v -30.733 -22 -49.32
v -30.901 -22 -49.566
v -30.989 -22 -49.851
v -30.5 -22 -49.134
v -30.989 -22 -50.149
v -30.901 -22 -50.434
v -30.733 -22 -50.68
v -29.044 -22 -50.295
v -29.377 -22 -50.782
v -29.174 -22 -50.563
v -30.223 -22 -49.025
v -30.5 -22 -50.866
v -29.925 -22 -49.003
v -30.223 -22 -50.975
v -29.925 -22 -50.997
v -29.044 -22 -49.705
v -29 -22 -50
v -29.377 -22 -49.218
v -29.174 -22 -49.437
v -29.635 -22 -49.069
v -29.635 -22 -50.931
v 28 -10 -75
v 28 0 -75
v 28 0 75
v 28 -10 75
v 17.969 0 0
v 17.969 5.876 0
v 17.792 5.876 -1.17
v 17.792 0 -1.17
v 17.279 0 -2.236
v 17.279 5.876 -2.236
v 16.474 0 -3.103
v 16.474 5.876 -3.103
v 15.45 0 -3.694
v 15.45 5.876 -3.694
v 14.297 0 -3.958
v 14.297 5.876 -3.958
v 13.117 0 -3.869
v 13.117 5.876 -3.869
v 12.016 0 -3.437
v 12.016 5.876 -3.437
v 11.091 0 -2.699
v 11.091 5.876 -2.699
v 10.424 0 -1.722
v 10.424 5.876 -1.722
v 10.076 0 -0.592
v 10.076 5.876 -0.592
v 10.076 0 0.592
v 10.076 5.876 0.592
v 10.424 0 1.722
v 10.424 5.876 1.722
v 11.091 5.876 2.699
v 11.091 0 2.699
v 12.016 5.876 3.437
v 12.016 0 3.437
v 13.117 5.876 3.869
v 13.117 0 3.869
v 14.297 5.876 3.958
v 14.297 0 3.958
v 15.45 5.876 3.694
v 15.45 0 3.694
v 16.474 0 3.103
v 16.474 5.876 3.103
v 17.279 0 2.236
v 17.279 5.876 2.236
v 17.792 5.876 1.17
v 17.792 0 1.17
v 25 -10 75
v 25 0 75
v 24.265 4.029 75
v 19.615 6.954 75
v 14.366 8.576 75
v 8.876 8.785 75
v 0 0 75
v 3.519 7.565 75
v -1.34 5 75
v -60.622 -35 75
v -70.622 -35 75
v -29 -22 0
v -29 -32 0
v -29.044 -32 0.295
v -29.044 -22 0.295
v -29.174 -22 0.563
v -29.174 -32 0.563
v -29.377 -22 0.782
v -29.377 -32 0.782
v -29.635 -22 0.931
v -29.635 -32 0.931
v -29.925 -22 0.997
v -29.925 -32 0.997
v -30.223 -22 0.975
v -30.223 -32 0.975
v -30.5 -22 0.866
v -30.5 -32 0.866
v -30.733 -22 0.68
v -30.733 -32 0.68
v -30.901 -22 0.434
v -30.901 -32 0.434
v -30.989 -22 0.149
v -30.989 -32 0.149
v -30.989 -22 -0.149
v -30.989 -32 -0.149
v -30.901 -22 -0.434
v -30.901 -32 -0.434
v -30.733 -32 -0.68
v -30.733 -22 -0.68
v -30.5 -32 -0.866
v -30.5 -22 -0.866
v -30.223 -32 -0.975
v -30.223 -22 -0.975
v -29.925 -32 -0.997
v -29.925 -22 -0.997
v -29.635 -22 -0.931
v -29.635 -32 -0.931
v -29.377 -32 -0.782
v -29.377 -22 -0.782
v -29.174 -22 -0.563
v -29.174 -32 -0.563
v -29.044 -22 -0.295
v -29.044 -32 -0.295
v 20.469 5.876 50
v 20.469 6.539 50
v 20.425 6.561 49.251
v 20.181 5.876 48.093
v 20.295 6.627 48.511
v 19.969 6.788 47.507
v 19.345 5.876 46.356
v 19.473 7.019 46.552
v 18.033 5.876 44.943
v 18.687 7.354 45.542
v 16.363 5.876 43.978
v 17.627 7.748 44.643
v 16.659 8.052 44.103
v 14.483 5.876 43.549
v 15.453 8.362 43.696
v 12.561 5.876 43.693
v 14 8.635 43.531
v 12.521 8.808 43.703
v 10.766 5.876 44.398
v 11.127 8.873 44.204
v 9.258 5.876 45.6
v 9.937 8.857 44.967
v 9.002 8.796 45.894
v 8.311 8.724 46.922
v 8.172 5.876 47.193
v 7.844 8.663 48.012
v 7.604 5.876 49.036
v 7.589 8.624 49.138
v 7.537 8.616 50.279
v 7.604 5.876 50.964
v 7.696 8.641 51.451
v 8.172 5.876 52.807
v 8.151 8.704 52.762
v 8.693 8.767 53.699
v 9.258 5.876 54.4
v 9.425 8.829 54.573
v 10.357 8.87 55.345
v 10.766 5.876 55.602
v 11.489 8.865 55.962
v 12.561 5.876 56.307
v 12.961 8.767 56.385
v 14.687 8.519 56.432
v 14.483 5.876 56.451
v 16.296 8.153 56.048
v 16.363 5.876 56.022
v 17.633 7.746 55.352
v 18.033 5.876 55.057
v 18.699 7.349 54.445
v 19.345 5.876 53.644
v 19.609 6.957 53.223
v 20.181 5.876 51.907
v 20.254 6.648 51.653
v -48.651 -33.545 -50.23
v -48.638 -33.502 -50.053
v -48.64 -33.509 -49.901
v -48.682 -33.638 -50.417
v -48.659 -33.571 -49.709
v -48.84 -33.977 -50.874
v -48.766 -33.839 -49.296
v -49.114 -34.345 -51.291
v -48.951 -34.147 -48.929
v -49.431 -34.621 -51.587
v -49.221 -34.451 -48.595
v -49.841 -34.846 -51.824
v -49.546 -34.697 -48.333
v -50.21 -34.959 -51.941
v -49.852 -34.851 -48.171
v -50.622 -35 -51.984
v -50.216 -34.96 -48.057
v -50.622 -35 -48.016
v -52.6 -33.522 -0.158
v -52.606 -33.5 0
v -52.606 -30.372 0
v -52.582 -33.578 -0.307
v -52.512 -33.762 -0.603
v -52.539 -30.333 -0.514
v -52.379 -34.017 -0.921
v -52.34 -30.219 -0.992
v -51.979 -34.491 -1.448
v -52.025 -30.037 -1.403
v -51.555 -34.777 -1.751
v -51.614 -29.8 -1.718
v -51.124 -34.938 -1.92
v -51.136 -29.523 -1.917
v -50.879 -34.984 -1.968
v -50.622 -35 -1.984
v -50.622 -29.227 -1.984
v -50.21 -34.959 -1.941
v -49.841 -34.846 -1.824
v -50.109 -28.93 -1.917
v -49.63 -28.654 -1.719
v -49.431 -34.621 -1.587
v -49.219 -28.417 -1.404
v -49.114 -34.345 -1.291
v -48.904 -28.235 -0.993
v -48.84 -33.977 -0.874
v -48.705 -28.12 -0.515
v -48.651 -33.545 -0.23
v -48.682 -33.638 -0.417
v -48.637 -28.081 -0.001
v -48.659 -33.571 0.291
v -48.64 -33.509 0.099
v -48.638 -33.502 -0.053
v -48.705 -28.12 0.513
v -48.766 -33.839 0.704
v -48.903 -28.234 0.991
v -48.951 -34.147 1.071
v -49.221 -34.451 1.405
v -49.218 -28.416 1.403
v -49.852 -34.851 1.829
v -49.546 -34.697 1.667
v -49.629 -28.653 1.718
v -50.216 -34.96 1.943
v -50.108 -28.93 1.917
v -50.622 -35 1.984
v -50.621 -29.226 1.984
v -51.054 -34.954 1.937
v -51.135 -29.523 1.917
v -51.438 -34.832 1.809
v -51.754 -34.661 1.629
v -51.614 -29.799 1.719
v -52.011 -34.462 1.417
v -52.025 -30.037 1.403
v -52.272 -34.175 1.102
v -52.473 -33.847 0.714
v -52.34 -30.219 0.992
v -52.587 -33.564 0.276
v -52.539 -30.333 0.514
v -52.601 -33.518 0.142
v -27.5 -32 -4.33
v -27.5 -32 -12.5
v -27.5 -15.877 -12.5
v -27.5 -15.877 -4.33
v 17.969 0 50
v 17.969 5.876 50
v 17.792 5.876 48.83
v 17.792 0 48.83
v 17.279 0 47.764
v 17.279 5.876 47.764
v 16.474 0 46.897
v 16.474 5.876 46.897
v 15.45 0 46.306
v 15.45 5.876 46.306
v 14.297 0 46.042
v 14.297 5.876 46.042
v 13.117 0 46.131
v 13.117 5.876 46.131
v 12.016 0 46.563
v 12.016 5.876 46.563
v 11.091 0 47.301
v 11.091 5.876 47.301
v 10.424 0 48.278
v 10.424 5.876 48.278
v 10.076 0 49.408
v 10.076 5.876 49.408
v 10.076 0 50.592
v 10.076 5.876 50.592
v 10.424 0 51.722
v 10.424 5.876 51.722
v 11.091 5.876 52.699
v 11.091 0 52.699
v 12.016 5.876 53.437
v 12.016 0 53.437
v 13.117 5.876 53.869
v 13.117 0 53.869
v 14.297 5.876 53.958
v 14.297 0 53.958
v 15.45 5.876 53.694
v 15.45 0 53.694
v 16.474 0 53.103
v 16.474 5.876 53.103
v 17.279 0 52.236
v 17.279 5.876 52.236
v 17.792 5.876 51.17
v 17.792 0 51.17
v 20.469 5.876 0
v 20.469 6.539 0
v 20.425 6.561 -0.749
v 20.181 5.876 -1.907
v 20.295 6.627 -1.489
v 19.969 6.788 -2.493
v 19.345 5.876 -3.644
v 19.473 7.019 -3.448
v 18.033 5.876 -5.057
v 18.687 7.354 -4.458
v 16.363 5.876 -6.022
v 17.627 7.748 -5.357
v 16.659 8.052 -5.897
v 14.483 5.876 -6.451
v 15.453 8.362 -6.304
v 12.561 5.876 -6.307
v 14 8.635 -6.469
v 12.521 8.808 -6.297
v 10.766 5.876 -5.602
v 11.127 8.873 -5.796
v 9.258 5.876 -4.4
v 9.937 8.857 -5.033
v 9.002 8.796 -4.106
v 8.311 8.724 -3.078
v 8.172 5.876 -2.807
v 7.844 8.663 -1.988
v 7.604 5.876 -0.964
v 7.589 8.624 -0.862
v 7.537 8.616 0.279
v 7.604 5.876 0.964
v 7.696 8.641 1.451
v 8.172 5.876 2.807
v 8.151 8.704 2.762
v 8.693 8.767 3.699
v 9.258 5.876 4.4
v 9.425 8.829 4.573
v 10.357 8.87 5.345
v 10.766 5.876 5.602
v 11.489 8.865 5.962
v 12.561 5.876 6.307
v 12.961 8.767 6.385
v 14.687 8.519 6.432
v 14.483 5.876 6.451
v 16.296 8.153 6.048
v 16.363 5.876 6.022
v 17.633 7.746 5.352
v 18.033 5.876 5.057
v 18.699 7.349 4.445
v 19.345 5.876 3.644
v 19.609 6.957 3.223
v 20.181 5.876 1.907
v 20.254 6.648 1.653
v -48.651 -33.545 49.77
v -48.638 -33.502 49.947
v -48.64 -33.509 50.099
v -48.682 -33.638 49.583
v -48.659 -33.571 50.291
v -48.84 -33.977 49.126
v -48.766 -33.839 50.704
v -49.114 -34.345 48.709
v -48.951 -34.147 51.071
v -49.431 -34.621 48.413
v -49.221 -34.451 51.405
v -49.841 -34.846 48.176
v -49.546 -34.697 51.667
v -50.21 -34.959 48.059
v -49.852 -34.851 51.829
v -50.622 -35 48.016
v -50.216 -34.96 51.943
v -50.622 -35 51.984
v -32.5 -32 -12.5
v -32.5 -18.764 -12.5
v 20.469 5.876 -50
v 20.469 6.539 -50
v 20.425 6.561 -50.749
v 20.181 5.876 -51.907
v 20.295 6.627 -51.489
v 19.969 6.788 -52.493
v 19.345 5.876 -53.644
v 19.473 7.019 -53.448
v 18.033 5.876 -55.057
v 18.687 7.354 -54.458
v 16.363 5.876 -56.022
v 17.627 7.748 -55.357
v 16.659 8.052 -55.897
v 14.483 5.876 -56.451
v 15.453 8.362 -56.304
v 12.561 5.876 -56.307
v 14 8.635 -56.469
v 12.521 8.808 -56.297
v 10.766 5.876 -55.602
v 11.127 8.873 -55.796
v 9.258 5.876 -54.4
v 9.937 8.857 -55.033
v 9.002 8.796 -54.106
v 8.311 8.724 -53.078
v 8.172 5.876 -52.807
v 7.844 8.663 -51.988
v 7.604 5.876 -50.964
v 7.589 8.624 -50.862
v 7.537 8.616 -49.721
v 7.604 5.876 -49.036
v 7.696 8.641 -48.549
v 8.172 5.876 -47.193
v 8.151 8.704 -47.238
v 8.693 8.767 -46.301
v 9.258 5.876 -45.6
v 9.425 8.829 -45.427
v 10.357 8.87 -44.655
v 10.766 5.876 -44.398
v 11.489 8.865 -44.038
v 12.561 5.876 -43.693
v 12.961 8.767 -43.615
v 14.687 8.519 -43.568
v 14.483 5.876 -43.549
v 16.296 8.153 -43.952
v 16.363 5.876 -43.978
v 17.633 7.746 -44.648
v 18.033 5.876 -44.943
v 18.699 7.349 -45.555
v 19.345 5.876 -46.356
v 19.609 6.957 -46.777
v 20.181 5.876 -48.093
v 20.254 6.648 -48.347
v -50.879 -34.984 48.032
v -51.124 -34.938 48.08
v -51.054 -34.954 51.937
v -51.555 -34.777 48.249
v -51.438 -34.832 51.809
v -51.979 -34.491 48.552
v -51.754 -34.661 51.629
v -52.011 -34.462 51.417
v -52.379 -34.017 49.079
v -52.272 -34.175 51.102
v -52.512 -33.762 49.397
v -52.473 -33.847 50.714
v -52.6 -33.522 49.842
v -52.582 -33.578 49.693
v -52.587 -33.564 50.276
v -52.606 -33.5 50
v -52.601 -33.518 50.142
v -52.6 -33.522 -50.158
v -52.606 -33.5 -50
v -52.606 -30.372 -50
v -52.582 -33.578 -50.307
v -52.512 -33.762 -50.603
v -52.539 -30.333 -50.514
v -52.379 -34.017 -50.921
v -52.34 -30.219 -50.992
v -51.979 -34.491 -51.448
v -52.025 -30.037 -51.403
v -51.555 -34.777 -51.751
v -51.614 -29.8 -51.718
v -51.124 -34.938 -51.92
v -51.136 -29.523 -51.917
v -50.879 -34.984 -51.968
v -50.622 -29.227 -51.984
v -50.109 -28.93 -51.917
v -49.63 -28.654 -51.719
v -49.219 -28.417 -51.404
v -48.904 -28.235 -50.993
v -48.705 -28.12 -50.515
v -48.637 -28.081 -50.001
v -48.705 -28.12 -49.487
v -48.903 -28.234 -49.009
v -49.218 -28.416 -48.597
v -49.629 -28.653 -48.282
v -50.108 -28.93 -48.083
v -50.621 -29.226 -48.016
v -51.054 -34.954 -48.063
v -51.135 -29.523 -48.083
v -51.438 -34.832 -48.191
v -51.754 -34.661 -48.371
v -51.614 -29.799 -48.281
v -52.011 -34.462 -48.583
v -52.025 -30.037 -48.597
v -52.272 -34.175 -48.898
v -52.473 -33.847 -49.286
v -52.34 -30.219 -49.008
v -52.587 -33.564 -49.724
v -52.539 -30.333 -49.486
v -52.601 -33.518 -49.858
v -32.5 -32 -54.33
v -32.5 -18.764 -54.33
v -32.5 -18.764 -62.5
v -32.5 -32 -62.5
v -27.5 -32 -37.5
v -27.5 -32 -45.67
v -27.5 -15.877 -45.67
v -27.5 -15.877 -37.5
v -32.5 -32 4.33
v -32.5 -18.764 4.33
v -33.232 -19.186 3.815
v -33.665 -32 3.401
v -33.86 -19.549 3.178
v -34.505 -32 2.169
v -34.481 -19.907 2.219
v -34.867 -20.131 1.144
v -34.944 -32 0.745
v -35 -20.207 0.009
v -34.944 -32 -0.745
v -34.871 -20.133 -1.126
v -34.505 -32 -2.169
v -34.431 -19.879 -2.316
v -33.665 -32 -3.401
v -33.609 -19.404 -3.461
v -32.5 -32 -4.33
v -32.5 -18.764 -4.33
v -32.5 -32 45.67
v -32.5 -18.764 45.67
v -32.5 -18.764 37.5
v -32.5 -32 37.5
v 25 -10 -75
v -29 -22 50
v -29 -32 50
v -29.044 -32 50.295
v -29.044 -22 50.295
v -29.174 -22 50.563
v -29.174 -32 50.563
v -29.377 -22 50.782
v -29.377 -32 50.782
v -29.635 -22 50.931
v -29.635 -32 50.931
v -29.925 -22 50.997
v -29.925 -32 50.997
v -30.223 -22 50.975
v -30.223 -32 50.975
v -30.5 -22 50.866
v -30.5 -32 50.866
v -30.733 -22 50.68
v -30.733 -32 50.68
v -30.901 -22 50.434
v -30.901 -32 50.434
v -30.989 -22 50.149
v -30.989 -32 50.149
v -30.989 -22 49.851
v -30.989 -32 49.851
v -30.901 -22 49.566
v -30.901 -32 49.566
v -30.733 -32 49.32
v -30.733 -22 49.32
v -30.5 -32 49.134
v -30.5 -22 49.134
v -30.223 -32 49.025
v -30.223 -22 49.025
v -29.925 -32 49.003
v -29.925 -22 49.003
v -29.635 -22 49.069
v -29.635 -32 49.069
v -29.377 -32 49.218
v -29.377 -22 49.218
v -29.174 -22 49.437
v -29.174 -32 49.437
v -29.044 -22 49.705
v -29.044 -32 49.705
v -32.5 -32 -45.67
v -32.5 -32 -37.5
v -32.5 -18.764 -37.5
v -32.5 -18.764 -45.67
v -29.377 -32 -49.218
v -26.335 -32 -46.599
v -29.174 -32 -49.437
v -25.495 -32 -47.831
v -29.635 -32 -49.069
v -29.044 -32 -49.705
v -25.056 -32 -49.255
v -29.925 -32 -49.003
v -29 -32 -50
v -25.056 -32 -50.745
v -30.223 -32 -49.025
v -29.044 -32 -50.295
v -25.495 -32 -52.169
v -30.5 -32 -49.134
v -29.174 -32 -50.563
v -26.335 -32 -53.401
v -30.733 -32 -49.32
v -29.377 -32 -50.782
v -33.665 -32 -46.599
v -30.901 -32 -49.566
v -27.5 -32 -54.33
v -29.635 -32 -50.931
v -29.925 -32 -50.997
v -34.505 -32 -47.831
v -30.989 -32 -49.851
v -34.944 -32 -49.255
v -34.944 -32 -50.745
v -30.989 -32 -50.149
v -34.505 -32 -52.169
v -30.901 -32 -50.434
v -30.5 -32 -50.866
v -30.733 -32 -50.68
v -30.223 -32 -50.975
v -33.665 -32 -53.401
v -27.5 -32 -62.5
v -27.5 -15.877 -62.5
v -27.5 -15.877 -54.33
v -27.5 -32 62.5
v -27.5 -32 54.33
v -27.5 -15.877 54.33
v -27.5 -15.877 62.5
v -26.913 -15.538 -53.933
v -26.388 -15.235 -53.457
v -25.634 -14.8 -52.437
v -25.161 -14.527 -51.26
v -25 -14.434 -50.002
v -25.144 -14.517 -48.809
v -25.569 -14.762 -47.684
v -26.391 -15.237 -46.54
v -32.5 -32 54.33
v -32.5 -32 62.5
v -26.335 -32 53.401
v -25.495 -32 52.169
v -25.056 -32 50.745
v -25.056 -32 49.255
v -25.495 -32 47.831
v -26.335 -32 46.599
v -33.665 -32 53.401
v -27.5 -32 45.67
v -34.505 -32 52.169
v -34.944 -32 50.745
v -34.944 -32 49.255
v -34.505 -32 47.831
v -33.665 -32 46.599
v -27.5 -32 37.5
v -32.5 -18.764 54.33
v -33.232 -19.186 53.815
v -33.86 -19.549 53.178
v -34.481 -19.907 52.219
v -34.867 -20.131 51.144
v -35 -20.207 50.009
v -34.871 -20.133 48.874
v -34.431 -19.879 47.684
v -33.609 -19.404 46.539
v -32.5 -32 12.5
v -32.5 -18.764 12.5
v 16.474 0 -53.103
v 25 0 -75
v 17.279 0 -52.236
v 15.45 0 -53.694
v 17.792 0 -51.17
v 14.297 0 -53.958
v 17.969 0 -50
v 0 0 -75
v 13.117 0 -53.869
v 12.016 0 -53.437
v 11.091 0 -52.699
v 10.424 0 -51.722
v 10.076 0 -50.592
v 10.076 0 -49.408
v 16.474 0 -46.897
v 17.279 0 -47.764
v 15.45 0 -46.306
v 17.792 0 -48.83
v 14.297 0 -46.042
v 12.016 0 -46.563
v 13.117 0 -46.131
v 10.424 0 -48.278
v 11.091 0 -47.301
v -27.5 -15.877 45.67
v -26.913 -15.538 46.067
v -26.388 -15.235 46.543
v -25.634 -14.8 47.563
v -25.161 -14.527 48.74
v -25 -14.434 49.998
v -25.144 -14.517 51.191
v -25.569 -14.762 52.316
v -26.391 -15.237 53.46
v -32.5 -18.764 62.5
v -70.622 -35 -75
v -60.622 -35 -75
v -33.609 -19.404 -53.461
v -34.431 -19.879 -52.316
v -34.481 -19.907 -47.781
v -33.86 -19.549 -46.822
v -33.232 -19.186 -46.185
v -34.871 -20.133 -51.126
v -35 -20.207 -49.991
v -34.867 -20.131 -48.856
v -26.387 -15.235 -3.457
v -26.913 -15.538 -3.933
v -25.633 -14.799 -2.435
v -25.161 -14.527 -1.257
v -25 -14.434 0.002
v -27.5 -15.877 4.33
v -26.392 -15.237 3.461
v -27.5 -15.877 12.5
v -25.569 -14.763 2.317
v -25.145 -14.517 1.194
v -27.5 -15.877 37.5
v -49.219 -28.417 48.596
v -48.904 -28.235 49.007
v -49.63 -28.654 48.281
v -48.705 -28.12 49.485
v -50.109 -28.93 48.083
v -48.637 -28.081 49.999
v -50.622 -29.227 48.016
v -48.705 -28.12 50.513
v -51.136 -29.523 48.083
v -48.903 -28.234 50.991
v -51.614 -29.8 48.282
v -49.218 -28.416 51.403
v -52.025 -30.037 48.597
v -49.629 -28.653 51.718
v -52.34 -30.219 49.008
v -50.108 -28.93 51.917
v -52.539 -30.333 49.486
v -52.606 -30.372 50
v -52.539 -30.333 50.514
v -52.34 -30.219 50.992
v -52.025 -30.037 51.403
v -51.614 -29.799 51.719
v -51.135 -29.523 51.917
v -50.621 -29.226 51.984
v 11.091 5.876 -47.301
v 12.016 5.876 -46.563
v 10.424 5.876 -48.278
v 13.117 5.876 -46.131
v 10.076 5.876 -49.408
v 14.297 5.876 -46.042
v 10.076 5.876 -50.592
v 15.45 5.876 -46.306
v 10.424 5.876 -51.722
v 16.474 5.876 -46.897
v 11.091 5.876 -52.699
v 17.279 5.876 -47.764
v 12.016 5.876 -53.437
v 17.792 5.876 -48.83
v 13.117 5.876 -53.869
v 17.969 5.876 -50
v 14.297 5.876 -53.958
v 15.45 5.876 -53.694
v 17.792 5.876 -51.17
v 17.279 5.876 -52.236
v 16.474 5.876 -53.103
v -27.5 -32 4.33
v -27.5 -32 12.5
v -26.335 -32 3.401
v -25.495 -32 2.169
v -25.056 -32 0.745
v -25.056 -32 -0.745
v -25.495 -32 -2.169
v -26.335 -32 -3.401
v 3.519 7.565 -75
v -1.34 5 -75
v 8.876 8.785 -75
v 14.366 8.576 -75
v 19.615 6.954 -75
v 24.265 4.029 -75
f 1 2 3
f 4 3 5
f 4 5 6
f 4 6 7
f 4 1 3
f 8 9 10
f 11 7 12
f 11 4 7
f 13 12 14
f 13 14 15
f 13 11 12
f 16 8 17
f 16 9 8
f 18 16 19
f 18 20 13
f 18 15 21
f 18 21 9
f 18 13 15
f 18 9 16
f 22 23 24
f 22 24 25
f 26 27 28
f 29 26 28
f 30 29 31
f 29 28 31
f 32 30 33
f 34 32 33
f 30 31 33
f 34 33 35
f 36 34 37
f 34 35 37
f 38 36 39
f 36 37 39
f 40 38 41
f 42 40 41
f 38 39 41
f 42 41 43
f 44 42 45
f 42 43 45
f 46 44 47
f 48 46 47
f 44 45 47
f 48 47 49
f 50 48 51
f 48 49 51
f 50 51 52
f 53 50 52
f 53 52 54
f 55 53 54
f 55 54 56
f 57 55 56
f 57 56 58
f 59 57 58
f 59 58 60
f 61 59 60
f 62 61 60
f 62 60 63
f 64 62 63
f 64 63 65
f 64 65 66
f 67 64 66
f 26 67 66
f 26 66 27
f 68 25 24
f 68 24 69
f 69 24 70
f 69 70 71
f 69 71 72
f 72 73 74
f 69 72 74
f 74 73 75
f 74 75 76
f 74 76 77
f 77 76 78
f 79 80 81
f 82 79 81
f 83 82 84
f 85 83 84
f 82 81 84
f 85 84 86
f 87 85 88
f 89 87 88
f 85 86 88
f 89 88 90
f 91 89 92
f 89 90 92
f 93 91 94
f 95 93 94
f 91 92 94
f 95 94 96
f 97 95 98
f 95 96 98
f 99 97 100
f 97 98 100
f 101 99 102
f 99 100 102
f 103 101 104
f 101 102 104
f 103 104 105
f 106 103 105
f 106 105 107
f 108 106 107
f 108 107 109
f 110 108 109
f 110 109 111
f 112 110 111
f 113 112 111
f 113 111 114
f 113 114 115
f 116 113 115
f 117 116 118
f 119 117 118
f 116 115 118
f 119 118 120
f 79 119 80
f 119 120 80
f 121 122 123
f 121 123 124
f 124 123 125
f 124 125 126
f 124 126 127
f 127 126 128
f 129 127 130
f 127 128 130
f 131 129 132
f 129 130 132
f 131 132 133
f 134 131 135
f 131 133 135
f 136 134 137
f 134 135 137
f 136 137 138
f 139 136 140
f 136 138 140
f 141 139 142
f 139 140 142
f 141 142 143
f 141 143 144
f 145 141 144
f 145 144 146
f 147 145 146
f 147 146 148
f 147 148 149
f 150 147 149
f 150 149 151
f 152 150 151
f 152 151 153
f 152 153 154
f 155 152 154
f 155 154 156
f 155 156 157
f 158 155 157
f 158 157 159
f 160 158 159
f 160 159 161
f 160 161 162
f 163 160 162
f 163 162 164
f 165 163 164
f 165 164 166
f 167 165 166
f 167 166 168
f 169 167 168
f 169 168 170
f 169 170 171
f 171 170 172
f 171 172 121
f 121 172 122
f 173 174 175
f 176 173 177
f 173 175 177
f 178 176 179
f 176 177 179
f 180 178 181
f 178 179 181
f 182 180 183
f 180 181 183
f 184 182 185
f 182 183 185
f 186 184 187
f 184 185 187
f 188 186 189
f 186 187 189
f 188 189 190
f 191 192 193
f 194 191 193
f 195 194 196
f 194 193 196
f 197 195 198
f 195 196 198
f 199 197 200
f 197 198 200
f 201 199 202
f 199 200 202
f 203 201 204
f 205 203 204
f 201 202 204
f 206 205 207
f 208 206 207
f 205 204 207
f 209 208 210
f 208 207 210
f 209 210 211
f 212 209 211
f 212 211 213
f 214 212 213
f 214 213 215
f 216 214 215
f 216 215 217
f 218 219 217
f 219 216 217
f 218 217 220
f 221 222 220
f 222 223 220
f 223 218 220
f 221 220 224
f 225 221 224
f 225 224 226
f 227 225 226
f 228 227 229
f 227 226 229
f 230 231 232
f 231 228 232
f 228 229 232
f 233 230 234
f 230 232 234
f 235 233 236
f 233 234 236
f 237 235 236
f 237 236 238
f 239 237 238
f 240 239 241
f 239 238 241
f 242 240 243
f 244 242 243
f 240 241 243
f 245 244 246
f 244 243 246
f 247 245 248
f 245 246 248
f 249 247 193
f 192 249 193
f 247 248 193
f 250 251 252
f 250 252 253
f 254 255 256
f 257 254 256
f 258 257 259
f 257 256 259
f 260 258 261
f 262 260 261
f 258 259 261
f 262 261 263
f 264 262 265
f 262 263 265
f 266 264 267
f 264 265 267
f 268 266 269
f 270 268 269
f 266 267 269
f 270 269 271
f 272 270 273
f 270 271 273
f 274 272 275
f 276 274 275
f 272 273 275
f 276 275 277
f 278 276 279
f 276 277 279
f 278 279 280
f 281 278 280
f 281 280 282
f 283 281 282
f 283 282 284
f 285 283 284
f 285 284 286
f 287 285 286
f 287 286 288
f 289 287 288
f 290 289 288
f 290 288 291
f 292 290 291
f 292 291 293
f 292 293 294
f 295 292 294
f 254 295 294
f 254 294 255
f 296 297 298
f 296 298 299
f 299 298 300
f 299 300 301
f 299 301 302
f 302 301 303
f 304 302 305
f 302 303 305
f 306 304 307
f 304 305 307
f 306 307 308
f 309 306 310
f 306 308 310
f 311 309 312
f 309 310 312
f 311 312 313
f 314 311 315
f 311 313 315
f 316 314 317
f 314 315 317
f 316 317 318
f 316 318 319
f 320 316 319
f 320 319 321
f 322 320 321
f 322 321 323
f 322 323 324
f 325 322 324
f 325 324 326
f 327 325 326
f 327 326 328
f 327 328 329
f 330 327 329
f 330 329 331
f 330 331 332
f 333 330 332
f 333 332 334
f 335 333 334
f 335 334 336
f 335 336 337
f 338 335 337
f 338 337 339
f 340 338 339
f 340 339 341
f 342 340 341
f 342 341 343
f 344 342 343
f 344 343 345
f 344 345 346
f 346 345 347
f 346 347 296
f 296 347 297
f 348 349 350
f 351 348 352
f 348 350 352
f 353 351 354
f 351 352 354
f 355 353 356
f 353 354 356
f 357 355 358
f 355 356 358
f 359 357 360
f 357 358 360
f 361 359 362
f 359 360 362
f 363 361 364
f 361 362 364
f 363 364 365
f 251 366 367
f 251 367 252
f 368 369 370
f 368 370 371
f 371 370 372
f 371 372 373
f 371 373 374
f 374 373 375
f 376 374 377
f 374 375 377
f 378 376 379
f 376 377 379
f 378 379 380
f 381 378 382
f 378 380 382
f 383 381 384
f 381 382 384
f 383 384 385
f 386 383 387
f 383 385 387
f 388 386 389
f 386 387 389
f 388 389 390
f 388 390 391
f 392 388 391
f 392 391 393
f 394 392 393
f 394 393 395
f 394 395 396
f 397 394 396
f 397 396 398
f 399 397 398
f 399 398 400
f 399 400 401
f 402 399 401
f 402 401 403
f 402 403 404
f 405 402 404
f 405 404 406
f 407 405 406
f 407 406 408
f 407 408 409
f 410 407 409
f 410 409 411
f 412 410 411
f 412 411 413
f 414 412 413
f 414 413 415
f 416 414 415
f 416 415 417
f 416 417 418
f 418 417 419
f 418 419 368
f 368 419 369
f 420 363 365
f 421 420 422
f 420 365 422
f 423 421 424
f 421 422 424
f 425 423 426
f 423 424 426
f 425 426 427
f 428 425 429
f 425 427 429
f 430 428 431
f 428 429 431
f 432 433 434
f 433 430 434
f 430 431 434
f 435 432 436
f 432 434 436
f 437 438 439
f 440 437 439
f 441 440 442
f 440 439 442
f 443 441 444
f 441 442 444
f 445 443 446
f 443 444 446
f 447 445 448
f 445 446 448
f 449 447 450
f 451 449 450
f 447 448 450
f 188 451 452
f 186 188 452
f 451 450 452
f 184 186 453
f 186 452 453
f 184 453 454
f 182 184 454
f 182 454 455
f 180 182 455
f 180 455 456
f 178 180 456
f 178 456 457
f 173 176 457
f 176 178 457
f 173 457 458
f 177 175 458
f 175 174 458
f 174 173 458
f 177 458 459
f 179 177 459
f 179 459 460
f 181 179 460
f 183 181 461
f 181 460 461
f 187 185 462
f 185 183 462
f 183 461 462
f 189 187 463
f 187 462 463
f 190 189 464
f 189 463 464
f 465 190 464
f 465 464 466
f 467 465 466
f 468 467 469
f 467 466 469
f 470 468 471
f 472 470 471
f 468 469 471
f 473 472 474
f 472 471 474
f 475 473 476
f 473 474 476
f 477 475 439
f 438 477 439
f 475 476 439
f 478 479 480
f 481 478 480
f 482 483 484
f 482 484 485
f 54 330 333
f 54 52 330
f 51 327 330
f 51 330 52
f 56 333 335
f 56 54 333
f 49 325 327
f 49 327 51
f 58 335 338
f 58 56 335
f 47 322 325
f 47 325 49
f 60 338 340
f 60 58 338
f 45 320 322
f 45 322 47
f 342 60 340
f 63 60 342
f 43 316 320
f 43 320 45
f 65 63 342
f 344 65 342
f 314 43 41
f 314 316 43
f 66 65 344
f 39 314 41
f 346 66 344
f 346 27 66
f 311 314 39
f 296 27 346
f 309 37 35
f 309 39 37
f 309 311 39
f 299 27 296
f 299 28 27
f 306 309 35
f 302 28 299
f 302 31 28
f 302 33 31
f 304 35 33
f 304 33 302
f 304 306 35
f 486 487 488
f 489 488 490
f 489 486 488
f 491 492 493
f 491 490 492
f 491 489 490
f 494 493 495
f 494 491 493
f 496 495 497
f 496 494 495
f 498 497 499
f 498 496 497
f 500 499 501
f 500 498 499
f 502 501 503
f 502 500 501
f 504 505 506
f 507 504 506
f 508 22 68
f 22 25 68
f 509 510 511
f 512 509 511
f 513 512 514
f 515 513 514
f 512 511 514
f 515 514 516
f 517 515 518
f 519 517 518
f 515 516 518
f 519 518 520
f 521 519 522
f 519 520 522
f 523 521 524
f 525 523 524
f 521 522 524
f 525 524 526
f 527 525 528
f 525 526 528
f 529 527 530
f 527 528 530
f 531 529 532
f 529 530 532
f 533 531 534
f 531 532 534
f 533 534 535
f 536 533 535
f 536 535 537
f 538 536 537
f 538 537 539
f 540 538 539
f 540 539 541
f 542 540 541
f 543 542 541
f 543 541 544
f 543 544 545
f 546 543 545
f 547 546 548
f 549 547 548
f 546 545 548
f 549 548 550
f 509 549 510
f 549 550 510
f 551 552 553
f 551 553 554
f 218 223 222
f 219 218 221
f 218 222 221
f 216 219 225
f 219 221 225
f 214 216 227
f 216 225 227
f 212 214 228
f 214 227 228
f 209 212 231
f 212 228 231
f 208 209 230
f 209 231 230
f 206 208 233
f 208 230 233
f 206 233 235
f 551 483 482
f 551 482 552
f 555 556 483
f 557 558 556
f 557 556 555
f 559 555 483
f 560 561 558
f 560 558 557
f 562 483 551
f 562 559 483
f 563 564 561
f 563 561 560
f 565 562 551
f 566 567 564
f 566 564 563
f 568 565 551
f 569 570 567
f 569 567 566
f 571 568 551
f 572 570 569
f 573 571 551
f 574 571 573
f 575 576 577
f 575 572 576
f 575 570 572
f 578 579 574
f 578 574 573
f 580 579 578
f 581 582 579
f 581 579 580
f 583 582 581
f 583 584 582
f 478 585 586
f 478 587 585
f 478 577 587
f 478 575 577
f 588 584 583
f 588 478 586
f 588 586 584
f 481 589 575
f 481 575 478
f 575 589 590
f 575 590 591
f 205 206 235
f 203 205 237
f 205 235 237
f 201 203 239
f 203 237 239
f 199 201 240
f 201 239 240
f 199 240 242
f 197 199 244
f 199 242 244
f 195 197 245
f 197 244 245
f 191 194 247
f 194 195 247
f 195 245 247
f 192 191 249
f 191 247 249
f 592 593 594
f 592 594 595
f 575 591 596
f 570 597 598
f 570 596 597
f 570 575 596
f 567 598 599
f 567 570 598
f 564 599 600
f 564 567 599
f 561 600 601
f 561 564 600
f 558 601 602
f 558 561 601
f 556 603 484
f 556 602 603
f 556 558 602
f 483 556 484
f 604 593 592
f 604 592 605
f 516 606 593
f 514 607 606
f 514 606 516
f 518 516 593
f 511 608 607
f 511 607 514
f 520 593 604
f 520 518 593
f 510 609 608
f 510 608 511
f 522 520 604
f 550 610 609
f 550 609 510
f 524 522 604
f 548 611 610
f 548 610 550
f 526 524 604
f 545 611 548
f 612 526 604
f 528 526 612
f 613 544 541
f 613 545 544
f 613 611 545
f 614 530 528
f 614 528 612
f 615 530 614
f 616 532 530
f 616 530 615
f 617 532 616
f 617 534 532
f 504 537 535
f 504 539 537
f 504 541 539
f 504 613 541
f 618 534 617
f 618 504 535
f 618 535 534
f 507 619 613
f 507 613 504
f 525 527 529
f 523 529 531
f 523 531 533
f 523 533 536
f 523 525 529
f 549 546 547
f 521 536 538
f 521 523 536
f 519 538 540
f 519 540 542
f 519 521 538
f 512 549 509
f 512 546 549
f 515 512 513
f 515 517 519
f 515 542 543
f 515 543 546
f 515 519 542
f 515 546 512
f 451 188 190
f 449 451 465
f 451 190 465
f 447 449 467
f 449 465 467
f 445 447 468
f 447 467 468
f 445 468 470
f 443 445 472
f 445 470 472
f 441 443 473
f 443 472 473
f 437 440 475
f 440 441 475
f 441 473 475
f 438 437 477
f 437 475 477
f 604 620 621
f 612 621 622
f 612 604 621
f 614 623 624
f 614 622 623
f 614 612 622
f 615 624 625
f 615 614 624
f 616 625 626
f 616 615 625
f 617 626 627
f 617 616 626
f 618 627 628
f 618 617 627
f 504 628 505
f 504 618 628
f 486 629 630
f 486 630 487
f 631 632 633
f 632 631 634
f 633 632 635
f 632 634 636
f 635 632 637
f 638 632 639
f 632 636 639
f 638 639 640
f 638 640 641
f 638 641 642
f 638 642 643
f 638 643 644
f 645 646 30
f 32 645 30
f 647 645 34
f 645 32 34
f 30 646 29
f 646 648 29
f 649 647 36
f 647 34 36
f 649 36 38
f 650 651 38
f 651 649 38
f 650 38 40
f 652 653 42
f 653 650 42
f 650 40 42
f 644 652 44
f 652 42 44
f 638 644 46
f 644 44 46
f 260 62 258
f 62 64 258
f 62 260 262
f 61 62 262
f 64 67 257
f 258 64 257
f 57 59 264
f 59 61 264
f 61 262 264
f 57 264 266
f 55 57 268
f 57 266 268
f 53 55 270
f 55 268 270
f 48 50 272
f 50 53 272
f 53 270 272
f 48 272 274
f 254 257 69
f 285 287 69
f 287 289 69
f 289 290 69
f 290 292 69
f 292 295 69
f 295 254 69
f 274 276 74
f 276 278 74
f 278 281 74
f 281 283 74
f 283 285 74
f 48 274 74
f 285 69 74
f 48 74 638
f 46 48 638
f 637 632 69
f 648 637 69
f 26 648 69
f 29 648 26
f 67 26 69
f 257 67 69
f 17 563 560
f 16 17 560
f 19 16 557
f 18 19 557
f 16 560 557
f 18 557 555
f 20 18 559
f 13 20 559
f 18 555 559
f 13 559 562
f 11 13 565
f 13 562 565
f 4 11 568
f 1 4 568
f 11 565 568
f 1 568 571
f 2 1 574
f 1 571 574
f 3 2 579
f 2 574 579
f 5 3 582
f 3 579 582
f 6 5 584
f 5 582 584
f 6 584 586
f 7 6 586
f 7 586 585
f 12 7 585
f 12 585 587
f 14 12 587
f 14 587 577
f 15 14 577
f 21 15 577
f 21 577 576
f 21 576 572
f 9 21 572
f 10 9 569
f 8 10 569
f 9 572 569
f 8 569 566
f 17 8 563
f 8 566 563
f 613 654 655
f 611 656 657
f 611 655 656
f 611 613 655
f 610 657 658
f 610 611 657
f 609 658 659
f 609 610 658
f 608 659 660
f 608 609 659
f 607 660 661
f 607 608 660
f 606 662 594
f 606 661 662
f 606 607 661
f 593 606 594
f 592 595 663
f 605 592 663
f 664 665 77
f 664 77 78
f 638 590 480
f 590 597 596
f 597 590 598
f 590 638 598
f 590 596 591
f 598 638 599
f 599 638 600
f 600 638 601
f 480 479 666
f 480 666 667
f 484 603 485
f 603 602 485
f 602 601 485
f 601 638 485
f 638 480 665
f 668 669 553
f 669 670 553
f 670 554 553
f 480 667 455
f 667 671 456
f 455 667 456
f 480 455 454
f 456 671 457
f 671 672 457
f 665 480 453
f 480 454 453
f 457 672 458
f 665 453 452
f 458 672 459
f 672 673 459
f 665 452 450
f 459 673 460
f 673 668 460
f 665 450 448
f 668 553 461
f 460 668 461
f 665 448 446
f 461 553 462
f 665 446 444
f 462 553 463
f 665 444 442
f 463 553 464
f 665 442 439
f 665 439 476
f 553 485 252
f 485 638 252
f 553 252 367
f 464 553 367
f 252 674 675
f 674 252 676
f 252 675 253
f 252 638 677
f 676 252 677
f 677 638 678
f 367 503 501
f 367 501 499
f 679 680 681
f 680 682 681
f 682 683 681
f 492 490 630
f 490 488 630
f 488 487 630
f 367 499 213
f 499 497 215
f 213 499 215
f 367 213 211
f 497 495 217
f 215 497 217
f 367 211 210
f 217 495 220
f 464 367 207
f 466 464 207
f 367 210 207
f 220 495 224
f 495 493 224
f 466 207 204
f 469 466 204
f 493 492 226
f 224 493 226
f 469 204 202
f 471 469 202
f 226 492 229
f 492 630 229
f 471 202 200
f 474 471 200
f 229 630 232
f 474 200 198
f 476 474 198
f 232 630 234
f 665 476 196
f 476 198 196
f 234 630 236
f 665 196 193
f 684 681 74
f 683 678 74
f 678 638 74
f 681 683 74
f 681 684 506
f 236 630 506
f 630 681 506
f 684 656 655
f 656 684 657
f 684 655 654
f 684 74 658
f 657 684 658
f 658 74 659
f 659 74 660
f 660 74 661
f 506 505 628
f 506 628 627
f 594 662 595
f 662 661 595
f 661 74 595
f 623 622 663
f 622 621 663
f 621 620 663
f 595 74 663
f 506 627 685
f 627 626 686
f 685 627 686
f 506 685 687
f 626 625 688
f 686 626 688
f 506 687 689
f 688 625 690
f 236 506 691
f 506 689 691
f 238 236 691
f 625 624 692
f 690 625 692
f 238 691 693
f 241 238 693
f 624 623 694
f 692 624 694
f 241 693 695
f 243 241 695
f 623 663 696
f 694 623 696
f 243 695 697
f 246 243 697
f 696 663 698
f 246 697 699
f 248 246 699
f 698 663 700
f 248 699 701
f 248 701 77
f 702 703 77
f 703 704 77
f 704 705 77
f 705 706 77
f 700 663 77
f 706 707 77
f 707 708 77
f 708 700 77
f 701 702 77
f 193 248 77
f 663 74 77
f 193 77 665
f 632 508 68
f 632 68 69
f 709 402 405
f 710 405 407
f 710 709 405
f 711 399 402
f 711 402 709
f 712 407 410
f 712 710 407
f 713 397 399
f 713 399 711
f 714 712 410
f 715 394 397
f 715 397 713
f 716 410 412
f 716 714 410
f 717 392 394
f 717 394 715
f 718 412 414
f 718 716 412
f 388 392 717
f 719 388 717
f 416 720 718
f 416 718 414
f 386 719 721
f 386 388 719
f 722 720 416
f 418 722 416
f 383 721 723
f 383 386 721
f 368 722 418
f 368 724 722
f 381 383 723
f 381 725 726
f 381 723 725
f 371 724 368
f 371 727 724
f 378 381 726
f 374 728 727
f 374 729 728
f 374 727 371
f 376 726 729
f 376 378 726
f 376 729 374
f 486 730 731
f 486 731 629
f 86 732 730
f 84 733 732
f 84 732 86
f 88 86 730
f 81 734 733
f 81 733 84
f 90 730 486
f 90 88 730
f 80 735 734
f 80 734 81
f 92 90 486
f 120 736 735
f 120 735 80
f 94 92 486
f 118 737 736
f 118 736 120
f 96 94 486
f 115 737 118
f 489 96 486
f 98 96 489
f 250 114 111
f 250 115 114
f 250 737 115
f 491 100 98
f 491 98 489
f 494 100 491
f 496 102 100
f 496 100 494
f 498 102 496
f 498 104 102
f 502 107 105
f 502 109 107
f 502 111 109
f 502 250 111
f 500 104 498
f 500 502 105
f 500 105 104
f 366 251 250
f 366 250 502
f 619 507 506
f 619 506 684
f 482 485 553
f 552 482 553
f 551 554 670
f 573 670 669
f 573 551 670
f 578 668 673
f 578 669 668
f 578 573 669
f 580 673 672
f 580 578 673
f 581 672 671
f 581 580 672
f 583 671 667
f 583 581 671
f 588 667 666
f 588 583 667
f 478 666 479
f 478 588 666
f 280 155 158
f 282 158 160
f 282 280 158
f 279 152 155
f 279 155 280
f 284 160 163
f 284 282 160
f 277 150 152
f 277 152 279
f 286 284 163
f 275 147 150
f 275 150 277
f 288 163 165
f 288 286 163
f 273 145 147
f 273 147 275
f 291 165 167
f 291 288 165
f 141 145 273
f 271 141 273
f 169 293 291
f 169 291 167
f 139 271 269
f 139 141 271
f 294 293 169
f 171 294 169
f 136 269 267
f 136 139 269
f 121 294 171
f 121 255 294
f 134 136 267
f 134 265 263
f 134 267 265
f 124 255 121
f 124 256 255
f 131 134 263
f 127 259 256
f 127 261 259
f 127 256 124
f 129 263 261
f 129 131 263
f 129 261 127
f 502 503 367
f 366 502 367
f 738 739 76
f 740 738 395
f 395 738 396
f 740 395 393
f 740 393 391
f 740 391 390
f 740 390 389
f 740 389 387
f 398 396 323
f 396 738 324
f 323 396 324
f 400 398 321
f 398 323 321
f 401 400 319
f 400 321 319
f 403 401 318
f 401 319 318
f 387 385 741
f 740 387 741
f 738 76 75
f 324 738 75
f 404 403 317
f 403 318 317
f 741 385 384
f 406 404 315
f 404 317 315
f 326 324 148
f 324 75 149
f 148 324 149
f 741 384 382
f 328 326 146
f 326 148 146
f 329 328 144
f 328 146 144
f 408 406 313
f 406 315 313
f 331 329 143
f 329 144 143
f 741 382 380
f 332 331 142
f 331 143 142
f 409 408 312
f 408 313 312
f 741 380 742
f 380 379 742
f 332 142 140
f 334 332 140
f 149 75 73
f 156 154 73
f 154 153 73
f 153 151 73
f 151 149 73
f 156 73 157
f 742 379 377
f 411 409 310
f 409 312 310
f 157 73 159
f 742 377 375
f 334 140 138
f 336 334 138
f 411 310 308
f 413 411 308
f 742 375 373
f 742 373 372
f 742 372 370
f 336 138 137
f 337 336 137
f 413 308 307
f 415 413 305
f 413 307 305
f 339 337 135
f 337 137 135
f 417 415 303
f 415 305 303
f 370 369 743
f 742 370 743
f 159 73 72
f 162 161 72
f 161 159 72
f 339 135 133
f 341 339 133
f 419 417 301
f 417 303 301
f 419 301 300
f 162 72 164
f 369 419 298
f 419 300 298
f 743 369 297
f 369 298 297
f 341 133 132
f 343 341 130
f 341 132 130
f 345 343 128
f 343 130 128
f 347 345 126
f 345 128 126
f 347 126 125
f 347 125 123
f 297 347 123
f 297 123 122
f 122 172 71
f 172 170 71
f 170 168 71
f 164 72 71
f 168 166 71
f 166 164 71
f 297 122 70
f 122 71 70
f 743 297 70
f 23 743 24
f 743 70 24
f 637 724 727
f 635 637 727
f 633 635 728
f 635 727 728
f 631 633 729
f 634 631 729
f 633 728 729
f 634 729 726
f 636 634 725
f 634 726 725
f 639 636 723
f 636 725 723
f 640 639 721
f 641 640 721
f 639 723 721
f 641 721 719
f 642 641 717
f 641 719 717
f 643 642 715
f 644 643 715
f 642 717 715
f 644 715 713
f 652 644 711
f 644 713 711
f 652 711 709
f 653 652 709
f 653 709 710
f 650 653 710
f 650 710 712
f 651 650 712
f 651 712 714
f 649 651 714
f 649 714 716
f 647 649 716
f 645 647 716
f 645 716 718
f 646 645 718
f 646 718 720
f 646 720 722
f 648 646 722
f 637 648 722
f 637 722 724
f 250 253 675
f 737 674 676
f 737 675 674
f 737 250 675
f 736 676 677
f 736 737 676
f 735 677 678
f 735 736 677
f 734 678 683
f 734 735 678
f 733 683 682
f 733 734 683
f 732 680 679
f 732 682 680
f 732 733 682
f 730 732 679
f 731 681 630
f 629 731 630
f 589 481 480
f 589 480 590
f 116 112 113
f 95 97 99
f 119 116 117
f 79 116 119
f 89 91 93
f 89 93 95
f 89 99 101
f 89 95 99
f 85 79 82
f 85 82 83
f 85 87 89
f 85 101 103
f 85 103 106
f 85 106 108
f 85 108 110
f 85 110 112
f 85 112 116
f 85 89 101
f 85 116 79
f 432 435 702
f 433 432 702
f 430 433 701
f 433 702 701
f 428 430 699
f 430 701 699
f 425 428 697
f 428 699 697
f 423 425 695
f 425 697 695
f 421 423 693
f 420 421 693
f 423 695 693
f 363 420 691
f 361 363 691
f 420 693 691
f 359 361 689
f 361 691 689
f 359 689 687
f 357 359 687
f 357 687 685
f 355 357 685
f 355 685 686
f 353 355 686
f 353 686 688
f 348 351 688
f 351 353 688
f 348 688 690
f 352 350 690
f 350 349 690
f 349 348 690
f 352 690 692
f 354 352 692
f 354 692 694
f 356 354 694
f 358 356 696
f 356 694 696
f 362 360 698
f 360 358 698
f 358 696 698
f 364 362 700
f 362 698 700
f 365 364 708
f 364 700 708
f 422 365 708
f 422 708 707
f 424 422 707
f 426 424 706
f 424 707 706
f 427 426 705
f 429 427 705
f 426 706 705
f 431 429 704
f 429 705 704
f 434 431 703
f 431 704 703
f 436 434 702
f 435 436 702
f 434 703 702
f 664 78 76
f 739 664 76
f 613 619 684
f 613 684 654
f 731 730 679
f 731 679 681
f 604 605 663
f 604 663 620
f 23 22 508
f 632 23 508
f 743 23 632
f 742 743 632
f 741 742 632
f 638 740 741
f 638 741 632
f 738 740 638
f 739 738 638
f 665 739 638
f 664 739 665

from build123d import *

# Parameters (mm, degrees)
SALIENTE_EXTRUIR1_DEPTH = 75
SALIENTE_EXTRUIR2_START = -17
SALIENTE_EXTRUIR2_DEPTH = 17.566243
CROQUIS3_R              = 3.96875
CORTAR_EXTRUIR1_DEPTH   = 10
CROQUIS4_R              = 6.46875
CROQUIS4_R_2            = 3.96875
CORTAR_EXTRUIR2_DEPTH   = 3
SALIENTE_EXTRUIR3_START = -6.919182
CROQUIS7_R              = 1.984375
SALIENTE_EXTRUIR3_DEPTH = 6.919182
CORTAR_EXTRUIR3_DEPTH   = 75
CROQUIS9_R              = 1
CORTAR_EXTRUIR4_DEPTH   = 10


with BuildPart() as part:
    # Croquis1 → Saliente-Extruir1 (new body, symmetric)
    with BuildSketch(Plane.XY):
        with BuildLine():
            ThreePointArc((-1.339746, 5), (14.365661, 8.57646), (28, 0))
            Line((28, 0), (28, -10))
            Line((28, -10), (25, -10))
            Line((25, -10), (25, 0))
            Line((25, 0), (0, 0))
            Line((0, 0), (-60.621778, -35))
            Line((-60.621778, -35), (-70.621778, -35))
            Line((-70.621778, -35), (-1.339746, 5))
        make_face()
    extrude(amount=SALIENTE_EXTRUIR1_DEPTH, both=True)

    # Croquis2 → Saliente-Extruir2 (add)
    with BuildSketch(Plane(origin=(0, -15, 0), x_dir=(1, 0, 0), z_dir=(0, 1, 0)).offset(SALIENTE_EXTRUIR2_START)):
        with BuildLine():
            Line((-32.5, 4.330127), (-32.5, 12.5))
            Line((-32.5, 12.5), (-27.5, 12.5))
            Line((-27.5, 12.5), (-27.5, 4.330127))
            ThreePointArc((-27.5, 4.330127), (-25, 0), (-27.5, -4.330127))
            Line((-27.5, -4.330127), (-27.5, -12.5))
            Line((-27.5, -12.5), (-32.5, -12.5))
            Line((-32.5, -12.5), (-32.5, -4.330127))
            ThreePointArc((-32.5, -4.330127), (-35, 0), (-32.5, 4.330127))
        make_face()
        with BuildLine():
            Line((-32.5, 54.330127), (-32.5, 62.5))
            Line((-32.5, 62.5), (-27.5, 62.5))
            Line((-27.5, 62.5), (-27.5, 54.330127))
            ThreePointArc((-27.5, 54.330127), (-25, 50), (-27.5, 45.669873))
            Line((-27.5, 45.669873), (-27.5, 37.5))
            Line((-27.5, 37.5), (-32.5, 37.5))
            Line((-32.5, 37.5), (-32.5, 45.669873))
            ThreePointArc((-32.5, 45.669873), (-35, 50), (-32.5, 54.330127))
        make_face()
        with BuildLine():
            Line((-32.5, -45.669873), (-32.5, -37.5))
            Line((-32.5, -37.5), (-27.5, -37.5))
            Line((-27.5, -37.5), (-27.5, -45.669873))
            ThreePointArc((-27.5, -45.669873), (-25, -50), (-27.5, -54.330127))
            Line((-27.5, -54.330127), (-27.5, -62.5))
            Line((-27.5, -62.5), (-32.5, -62.5))
            Line((-32.5, -62.5), (-32.5, -54.330127))
            ThreePointArc((-32.5, -54.330127), (-35, -50), (-32.5, -45.669873))
        make_face()
    extrude(amount=SALIENTE_EXTRUIR2_DEPTH)

    # Croquis3 → Cortar-Extruir1 (cut)
    with BuildSketch(Plane(origin=(0, 8.875562, 0), x_dir=(1, 0, 0), z_dir=(0, 1, 0))):
        with Locations((14, -50)):
            Circle(CROQUIS3_R)
        with Locations((14, 0)):
            Circle(CROQUIS3_R)
        with Locations((14, 50)):
            Circle(CROQUIS3_R)
    extrude(amount=-CORTAR_EXTRUIR1_DEPTH, mode=Mode.SUBTRACT)

    # Croquis4 → Cortar-Extruir2 (cut)
    with BuildSketch(Plane(origin=(0, 8.875562, 0), x_dir=(1, 0, 0), z_dir=(0, 1, 0))):
        with Locations((14, 50)):
            Circle(CROQUIS4_R)
        with Locations((14, 50)):
            Circle(CROQUIS4_R_2, mode=Mode.SUBTRACT)
        with Locations((14, 0)):
            Circle(CROQUIS4_R)
        with Locations((14, 0)):
            Circle(CROQUIS4_R_2, mode=Mode.SUBTRACT)
        with Locations((14, -50)):
            Circle(CROQUIS4_R)
        with Locations((14, -50)):
            Circle(CROQUIS4_R_2, mode=Mode.SUBTRACT)
    extrude(amount=-CORTAR_EXTRUIR2_DEPTH, mode=Mode.SUBTRACT)

    # Croquis7 → Saliente-Extruir3 (add)
    with BuildSketch(Plane(origin=(0, -35, 0), x_dir=(-1, 0, 0), z_dir=(0, -1, 0)).offset(SALIENTE_EXTRUIR3_START)):
        with Locations((50.621778, 0)):
            Circle(CROQUIS7_R)
        with Locations((50.621778, 50)):
            Circle(CROQUIS7_R)
        with Locations((50.621778, -50)):
            Circle(CROQUIS7_R)
    extrude(amount=SALIENTE_EXTRUIR3_DEPTH)

    # Croquis8 → Cortar-Extruir3 (cut, symmetric)
    with BuildSketch(Plane.XY):
        with BuildLine():
            ThreePointArc((-50.621778, -35), (-51.865537, -34.582808), (-52.606153, -33.5))
            Line((-52.606153, -33.5), (-52.606153, -35))
            Line((-52.606153, -35), (-50.621778, -35))
        make_face()
        with BuildLine():
            ThreePointArc((-48.637403, -33.5), (-49.378019, -34.582808), (-50.621778, -35))
            Line((-50.621778, -35), (-48.637403, -35))
            Line((-48.637403, -35), (-48.637403, -33.5))
        make_face()
    extrude(amount=CORTAR_EXTRUIR3_DEPTH, both=True, mode=Mode.SUBTRACT)

    # Croquis9 → Cortar-Extruir4 (cut)
    with BuildSketch(Plane.XZ.offset(32)):
        with Locations((-30, 0)):
            Circle(CROQUIS9_R)
        with Locations((-30, 50)):
            Circle(CROQUIS9_R)
        with Locations((-30, -50)):
            Circle(CROQUIS9_R)
    extrude(amount=-CORTAR_EXTRUIR4_DEPTH, mode=Mode.SUBTRACT)


solid = part.part
